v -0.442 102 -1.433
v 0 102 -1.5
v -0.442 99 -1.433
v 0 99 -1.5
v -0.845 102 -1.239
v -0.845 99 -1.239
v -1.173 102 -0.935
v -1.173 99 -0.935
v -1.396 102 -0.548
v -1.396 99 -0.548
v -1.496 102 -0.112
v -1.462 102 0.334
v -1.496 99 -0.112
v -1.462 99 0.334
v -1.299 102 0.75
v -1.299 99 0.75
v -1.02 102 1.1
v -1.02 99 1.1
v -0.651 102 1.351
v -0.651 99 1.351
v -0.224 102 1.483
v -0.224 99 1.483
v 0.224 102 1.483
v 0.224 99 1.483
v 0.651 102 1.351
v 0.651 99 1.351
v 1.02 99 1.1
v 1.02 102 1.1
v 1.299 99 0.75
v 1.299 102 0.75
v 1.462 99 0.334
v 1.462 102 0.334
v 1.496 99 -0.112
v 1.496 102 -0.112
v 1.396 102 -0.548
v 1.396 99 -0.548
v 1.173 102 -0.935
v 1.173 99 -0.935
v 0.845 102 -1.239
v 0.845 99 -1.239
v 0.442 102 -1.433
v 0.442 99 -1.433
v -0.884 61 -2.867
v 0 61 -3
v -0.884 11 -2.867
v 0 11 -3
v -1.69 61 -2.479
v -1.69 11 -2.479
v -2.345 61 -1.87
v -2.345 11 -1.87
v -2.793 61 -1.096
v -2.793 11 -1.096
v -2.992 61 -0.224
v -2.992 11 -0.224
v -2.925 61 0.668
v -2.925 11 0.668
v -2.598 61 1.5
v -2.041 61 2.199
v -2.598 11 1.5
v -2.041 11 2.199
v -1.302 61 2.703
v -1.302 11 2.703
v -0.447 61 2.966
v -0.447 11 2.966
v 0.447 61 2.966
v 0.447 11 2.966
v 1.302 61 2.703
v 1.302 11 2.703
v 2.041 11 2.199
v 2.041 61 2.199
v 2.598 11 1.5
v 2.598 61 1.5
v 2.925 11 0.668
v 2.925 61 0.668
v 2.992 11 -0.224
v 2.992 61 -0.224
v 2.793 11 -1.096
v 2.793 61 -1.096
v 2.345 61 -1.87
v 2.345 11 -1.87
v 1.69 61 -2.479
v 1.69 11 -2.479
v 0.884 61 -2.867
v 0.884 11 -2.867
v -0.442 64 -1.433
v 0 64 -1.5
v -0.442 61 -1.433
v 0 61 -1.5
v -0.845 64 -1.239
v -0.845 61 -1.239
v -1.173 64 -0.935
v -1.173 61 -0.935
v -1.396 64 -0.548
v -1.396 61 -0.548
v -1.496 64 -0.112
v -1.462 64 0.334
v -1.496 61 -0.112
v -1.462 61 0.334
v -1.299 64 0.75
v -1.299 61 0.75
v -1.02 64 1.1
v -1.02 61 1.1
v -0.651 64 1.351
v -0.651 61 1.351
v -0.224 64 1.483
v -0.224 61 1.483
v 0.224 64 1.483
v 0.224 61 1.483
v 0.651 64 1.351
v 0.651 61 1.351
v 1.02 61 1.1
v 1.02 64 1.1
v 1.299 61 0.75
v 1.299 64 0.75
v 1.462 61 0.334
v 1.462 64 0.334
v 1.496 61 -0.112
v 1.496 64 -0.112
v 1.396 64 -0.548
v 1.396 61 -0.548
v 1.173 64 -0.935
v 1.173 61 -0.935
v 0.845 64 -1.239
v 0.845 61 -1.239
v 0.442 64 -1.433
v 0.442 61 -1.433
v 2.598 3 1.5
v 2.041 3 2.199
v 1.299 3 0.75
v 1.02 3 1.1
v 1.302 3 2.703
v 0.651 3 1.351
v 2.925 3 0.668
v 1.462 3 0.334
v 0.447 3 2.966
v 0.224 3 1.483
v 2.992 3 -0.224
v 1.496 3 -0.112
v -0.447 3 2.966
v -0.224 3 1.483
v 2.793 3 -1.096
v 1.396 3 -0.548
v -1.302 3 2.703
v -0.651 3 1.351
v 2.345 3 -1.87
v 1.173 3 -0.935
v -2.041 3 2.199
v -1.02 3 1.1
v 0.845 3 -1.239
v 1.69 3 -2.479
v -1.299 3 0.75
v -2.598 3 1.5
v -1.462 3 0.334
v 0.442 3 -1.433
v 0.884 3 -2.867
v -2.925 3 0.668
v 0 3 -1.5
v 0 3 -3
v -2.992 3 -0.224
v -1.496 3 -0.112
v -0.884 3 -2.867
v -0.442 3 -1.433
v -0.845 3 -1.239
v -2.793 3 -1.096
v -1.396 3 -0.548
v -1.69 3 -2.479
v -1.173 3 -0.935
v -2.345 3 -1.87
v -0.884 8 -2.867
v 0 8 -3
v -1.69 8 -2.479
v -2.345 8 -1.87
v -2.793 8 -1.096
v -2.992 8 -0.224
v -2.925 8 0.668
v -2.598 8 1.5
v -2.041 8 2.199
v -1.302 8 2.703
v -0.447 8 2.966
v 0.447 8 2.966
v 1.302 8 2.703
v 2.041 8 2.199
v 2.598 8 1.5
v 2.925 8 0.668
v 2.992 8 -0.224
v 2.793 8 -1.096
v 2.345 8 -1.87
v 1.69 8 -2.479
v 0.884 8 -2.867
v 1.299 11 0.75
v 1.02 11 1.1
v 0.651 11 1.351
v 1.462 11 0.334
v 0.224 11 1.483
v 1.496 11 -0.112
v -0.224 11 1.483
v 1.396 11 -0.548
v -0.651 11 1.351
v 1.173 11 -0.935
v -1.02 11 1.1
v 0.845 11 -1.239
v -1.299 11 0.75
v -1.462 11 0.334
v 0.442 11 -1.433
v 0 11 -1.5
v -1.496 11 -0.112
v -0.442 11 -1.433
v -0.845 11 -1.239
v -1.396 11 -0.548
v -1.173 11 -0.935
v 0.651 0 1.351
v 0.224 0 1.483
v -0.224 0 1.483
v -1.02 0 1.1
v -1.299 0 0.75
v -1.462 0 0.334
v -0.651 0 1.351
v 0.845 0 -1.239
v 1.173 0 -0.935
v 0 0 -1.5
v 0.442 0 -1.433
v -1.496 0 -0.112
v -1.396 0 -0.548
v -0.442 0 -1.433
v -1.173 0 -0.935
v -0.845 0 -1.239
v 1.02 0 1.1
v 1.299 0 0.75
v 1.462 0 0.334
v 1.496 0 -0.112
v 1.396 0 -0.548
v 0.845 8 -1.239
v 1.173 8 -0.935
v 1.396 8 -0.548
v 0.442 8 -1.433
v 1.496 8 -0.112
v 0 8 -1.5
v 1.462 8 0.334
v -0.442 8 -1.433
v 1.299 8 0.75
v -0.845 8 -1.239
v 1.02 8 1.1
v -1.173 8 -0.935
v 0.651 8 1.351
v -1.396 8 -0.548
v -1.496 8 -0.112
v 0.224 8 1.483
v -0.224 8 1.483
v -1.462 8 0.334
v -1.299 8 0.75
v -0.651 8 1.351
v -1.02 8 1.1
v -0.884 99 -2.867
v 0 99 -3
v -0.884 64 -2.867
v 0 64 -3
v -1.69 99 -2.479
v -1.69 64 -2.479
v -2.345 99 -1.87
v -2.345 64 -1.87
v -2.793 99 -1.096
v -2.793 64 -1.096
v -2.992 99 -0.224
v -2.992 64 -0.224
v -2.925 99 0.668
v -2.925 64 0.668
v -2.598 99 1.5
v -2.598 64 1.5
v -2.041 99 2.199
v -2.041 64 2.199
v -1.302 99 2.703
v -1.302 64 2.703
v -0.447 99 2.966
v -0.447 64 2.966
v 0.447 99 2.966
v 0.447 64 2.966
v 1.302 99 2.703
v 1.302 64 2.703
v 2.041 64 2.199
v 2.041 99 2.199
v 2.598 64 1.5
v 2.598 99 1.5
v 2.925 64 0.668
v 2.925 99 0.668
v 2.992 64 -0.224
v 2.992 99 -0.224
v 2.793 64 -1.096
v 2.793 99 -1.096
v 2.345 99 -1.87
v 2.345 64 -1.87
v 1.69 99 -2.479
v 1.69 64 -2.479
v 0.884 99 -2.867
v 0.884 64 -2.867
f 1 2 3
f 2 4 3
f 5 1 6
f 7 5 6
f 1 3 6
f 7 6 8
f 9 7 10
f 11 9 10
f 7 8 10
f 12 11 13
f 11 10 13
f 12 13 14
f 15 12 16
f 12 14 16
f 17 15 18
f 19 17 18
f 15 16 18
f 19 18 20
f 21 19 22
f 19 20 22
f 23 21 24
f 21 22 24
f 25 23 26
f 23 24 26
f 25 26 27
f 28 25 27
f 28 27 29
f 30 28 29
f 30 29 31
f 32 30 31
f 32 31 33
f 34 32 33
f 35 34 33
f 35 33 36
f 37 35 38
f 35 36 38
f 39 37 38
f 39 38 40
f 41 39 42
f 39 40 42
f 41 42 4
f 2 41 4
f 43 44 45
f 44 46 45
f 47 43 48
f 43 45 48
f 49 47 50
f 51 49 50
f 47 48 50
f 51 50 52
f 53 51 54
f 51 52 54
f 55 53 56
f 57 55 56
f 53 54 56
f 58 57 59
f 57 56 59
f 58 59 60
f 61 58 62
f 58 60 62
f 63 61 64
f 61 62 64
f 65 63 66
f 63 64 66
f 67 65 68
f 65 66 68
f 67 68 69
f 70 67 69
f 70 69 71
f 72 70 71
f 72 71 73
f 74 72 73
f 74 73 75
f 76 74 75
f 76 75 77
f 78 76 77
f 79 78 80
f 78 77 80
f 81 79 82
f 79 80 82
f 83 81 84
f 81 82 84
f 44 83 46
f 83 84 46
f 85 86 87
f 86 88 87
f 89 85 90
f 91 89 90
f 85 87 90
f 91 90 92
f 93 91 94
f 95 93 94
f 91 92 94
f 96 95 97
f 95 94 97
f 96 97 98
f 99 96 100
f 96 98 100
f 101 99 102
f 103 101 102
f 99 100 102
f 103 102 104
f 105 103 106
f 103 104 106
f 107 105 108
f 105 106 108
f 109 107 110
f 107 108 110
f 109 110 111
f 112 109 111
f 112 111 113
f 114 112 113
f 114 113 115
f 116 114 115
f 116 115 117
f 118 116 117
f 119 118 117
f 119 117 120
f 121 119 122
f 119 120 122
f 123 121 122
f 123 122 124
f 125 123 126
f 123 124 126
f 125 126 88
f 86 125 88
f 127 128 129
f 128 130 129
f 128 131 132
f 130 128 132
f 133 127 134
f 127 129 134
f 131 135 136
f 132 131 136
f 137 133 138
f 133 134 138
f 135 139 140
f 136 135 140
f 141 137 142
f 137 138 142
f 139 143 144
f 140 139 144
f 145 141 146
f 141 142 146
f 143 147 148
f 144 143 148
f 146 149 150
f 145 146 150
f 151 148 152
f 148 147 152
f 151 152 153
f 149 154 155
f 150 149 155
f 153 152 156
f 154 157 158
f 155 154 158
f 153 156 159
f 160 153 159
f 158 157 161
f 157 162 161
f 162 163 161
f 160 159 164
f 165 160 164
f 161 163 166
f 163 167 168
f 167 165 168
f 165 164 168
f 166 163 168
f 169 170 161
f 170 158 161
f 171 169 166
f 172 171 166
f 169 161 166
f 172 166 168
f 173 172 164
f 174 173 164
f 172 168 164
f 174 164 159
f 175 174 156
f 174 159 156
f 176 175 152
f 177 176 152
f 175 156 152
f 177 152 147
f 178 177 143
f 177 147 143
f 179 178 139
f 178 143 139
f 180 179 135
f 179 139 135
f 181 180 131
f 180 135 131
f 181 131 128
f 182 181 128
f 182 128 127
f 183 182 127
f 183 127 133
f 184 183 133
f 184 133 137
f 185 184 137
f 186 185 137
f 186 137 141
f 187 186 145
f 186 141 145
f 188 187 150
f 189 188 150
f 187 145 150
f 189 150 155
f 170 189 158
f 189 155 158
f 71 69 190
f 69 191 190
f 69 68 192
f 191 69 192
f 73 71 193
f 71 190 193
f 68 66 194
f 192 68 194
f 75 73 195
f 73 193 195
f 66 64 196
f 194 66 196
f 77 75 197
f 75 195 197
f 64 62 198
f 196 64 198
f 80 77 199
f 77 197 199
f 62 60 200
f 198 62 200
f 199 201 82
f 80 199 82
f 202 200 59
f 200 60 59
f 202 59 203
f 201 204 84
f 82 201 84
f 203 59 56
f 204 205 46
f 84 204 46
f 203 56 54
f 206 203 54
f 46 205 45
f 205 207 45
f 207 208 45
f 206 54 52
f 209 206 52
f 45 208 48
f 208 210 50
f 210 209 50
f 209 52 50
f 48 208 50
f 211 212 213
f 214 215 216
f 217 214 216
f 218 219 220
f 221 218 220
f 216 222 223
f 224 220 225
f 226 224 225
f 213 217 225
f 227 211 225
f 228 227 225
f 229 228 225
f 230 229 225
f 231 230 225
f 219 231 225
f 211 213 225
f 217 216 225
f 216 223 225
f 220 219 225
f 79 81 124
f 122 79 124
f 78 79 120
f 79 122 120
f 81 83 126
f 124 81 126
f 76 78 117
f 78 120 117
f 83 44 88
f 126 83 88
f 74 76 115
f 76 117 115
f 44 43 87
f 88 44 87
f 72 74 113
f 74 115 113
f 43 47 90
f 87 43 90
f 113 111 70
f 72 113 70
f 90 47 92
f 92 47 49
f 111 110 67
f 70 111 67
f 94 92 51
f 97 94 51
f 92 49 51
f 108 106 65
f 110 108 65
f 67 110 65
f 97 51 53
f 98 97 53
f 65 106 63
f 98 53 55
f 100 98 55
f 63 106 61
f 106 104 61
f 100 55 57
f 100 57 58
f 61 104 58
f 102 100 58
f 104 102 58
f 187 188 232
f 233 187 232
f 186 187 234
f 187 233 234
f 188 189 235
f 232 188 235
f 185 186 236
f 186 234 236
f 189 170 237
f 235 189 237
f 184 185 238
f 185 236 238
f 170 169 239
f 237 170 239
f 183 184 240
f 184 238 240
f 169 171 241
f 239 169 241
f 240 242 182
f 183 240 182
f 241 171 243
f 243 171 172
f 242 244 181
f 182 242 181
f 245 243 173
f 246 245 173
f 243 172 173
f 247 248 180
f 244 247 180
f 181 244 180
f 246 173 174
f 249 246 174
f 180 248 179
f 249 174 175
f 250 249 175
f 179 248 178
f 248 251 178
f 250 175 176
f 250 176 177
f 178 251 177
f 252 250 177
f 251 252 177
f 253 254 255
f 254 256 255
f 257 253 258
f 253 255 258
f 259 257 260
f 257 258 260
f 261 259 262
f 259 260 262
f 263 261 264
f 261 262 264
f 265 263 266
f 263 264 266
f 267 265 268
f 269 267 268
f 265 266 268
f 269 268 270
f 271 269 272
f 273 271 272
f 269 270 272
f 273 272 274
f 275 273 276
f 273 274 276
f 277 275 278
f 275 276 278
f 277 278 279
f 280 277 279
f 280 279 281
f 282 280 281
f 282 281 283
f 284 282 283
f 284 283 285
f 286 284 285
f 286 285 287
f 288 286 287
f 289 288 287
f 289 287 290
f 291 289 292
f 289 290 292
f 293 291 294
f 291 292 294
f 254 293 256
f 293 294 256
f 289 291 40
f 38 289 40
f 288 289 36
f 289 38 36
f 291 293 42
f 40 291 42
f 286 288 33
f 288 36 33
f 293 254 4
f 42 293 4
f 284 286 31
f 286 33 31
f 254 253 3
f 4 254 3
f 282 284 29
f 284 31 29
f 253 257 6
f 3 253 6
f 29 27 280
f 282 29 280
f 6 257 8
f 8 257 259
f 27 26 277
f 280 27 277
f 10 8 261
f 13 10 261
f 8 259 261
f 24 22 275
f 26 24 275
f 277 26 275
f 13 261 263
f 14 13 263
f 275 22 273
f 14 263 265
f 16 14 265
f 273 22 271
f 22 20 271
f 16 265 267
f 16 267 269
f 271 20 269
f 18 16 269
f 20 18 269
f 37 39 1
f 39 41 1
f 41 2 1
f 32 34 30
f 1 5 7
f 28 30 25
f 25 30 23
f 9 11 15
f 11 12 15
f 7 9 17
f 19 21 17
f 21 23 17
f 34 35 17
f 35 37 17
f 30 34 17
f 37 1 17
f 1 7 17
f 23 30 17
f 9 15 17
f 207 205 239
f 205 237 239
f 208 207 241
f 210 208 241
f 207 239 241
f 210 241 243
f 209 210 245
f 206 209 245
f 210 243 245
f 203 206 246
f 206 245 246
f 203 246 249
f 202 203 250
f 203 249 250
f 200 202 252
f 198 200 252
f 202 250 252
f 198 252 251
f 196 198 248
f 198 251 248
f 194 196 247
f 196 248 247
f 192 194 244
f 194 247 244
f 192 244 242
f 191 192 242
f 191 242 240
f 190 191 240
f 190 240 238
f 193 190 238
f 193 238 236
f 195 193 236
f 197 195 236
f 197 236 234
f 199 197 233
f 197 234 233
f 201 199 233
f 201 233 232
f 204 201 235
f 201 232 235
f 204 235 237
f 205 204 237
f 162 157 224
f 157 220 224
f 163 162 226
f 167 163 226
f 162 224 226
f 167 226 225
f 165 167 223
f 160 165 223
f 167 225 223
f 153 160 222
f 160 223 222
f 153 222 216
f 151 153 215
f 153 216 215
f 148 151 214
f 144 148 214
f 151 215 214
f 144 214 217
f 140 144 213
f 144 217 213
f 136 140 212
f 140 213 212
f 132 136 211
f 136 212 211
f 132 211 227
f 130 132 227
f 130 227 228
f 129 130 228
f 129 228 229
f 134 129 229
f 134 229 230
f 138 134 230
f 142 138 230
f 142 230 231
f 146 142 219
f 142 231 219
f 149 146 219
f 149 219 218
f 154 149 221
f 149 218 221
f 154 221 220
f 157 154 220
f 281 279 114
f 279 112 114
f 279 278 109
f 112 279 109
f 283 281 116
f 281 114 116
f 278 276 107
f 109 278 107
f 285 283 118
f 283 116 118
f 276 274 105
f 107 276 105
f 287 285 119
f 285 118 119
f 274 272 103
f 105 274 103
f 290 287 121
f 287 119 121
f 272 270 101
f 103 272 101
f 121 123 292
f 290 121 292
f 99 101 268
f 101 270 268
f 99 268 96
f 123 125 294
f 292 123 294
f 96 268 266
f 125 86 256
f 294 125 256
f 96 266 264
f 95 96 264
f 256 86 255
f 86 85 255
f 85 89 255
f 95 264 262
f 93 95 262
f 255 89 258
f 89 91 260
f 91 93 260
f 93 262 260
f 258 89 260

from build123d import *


with BuildPart() as part:
    # Sketch1 → Revolve1 (revolve)
    with BuildSketch(Plane(origin=(0, 0, 0), x_dir=(0, 0, -1), z_dir=(1, 0, 0))):
        Polygon((0, 102), (1.5, 102), (1.5, 99), (3, 99), (3, 64), (1.5, 64), (1.5, 61), (3, 61), (3, 11), (1.5, 11), (1.5, 8), (3, 8), (3, 3), (1.5, 3), (1.5, 0), (0, 0), align=None)
    revolve(axis=Axis((0, 0, 0), (0, 1, 0)))


solid = part.part
